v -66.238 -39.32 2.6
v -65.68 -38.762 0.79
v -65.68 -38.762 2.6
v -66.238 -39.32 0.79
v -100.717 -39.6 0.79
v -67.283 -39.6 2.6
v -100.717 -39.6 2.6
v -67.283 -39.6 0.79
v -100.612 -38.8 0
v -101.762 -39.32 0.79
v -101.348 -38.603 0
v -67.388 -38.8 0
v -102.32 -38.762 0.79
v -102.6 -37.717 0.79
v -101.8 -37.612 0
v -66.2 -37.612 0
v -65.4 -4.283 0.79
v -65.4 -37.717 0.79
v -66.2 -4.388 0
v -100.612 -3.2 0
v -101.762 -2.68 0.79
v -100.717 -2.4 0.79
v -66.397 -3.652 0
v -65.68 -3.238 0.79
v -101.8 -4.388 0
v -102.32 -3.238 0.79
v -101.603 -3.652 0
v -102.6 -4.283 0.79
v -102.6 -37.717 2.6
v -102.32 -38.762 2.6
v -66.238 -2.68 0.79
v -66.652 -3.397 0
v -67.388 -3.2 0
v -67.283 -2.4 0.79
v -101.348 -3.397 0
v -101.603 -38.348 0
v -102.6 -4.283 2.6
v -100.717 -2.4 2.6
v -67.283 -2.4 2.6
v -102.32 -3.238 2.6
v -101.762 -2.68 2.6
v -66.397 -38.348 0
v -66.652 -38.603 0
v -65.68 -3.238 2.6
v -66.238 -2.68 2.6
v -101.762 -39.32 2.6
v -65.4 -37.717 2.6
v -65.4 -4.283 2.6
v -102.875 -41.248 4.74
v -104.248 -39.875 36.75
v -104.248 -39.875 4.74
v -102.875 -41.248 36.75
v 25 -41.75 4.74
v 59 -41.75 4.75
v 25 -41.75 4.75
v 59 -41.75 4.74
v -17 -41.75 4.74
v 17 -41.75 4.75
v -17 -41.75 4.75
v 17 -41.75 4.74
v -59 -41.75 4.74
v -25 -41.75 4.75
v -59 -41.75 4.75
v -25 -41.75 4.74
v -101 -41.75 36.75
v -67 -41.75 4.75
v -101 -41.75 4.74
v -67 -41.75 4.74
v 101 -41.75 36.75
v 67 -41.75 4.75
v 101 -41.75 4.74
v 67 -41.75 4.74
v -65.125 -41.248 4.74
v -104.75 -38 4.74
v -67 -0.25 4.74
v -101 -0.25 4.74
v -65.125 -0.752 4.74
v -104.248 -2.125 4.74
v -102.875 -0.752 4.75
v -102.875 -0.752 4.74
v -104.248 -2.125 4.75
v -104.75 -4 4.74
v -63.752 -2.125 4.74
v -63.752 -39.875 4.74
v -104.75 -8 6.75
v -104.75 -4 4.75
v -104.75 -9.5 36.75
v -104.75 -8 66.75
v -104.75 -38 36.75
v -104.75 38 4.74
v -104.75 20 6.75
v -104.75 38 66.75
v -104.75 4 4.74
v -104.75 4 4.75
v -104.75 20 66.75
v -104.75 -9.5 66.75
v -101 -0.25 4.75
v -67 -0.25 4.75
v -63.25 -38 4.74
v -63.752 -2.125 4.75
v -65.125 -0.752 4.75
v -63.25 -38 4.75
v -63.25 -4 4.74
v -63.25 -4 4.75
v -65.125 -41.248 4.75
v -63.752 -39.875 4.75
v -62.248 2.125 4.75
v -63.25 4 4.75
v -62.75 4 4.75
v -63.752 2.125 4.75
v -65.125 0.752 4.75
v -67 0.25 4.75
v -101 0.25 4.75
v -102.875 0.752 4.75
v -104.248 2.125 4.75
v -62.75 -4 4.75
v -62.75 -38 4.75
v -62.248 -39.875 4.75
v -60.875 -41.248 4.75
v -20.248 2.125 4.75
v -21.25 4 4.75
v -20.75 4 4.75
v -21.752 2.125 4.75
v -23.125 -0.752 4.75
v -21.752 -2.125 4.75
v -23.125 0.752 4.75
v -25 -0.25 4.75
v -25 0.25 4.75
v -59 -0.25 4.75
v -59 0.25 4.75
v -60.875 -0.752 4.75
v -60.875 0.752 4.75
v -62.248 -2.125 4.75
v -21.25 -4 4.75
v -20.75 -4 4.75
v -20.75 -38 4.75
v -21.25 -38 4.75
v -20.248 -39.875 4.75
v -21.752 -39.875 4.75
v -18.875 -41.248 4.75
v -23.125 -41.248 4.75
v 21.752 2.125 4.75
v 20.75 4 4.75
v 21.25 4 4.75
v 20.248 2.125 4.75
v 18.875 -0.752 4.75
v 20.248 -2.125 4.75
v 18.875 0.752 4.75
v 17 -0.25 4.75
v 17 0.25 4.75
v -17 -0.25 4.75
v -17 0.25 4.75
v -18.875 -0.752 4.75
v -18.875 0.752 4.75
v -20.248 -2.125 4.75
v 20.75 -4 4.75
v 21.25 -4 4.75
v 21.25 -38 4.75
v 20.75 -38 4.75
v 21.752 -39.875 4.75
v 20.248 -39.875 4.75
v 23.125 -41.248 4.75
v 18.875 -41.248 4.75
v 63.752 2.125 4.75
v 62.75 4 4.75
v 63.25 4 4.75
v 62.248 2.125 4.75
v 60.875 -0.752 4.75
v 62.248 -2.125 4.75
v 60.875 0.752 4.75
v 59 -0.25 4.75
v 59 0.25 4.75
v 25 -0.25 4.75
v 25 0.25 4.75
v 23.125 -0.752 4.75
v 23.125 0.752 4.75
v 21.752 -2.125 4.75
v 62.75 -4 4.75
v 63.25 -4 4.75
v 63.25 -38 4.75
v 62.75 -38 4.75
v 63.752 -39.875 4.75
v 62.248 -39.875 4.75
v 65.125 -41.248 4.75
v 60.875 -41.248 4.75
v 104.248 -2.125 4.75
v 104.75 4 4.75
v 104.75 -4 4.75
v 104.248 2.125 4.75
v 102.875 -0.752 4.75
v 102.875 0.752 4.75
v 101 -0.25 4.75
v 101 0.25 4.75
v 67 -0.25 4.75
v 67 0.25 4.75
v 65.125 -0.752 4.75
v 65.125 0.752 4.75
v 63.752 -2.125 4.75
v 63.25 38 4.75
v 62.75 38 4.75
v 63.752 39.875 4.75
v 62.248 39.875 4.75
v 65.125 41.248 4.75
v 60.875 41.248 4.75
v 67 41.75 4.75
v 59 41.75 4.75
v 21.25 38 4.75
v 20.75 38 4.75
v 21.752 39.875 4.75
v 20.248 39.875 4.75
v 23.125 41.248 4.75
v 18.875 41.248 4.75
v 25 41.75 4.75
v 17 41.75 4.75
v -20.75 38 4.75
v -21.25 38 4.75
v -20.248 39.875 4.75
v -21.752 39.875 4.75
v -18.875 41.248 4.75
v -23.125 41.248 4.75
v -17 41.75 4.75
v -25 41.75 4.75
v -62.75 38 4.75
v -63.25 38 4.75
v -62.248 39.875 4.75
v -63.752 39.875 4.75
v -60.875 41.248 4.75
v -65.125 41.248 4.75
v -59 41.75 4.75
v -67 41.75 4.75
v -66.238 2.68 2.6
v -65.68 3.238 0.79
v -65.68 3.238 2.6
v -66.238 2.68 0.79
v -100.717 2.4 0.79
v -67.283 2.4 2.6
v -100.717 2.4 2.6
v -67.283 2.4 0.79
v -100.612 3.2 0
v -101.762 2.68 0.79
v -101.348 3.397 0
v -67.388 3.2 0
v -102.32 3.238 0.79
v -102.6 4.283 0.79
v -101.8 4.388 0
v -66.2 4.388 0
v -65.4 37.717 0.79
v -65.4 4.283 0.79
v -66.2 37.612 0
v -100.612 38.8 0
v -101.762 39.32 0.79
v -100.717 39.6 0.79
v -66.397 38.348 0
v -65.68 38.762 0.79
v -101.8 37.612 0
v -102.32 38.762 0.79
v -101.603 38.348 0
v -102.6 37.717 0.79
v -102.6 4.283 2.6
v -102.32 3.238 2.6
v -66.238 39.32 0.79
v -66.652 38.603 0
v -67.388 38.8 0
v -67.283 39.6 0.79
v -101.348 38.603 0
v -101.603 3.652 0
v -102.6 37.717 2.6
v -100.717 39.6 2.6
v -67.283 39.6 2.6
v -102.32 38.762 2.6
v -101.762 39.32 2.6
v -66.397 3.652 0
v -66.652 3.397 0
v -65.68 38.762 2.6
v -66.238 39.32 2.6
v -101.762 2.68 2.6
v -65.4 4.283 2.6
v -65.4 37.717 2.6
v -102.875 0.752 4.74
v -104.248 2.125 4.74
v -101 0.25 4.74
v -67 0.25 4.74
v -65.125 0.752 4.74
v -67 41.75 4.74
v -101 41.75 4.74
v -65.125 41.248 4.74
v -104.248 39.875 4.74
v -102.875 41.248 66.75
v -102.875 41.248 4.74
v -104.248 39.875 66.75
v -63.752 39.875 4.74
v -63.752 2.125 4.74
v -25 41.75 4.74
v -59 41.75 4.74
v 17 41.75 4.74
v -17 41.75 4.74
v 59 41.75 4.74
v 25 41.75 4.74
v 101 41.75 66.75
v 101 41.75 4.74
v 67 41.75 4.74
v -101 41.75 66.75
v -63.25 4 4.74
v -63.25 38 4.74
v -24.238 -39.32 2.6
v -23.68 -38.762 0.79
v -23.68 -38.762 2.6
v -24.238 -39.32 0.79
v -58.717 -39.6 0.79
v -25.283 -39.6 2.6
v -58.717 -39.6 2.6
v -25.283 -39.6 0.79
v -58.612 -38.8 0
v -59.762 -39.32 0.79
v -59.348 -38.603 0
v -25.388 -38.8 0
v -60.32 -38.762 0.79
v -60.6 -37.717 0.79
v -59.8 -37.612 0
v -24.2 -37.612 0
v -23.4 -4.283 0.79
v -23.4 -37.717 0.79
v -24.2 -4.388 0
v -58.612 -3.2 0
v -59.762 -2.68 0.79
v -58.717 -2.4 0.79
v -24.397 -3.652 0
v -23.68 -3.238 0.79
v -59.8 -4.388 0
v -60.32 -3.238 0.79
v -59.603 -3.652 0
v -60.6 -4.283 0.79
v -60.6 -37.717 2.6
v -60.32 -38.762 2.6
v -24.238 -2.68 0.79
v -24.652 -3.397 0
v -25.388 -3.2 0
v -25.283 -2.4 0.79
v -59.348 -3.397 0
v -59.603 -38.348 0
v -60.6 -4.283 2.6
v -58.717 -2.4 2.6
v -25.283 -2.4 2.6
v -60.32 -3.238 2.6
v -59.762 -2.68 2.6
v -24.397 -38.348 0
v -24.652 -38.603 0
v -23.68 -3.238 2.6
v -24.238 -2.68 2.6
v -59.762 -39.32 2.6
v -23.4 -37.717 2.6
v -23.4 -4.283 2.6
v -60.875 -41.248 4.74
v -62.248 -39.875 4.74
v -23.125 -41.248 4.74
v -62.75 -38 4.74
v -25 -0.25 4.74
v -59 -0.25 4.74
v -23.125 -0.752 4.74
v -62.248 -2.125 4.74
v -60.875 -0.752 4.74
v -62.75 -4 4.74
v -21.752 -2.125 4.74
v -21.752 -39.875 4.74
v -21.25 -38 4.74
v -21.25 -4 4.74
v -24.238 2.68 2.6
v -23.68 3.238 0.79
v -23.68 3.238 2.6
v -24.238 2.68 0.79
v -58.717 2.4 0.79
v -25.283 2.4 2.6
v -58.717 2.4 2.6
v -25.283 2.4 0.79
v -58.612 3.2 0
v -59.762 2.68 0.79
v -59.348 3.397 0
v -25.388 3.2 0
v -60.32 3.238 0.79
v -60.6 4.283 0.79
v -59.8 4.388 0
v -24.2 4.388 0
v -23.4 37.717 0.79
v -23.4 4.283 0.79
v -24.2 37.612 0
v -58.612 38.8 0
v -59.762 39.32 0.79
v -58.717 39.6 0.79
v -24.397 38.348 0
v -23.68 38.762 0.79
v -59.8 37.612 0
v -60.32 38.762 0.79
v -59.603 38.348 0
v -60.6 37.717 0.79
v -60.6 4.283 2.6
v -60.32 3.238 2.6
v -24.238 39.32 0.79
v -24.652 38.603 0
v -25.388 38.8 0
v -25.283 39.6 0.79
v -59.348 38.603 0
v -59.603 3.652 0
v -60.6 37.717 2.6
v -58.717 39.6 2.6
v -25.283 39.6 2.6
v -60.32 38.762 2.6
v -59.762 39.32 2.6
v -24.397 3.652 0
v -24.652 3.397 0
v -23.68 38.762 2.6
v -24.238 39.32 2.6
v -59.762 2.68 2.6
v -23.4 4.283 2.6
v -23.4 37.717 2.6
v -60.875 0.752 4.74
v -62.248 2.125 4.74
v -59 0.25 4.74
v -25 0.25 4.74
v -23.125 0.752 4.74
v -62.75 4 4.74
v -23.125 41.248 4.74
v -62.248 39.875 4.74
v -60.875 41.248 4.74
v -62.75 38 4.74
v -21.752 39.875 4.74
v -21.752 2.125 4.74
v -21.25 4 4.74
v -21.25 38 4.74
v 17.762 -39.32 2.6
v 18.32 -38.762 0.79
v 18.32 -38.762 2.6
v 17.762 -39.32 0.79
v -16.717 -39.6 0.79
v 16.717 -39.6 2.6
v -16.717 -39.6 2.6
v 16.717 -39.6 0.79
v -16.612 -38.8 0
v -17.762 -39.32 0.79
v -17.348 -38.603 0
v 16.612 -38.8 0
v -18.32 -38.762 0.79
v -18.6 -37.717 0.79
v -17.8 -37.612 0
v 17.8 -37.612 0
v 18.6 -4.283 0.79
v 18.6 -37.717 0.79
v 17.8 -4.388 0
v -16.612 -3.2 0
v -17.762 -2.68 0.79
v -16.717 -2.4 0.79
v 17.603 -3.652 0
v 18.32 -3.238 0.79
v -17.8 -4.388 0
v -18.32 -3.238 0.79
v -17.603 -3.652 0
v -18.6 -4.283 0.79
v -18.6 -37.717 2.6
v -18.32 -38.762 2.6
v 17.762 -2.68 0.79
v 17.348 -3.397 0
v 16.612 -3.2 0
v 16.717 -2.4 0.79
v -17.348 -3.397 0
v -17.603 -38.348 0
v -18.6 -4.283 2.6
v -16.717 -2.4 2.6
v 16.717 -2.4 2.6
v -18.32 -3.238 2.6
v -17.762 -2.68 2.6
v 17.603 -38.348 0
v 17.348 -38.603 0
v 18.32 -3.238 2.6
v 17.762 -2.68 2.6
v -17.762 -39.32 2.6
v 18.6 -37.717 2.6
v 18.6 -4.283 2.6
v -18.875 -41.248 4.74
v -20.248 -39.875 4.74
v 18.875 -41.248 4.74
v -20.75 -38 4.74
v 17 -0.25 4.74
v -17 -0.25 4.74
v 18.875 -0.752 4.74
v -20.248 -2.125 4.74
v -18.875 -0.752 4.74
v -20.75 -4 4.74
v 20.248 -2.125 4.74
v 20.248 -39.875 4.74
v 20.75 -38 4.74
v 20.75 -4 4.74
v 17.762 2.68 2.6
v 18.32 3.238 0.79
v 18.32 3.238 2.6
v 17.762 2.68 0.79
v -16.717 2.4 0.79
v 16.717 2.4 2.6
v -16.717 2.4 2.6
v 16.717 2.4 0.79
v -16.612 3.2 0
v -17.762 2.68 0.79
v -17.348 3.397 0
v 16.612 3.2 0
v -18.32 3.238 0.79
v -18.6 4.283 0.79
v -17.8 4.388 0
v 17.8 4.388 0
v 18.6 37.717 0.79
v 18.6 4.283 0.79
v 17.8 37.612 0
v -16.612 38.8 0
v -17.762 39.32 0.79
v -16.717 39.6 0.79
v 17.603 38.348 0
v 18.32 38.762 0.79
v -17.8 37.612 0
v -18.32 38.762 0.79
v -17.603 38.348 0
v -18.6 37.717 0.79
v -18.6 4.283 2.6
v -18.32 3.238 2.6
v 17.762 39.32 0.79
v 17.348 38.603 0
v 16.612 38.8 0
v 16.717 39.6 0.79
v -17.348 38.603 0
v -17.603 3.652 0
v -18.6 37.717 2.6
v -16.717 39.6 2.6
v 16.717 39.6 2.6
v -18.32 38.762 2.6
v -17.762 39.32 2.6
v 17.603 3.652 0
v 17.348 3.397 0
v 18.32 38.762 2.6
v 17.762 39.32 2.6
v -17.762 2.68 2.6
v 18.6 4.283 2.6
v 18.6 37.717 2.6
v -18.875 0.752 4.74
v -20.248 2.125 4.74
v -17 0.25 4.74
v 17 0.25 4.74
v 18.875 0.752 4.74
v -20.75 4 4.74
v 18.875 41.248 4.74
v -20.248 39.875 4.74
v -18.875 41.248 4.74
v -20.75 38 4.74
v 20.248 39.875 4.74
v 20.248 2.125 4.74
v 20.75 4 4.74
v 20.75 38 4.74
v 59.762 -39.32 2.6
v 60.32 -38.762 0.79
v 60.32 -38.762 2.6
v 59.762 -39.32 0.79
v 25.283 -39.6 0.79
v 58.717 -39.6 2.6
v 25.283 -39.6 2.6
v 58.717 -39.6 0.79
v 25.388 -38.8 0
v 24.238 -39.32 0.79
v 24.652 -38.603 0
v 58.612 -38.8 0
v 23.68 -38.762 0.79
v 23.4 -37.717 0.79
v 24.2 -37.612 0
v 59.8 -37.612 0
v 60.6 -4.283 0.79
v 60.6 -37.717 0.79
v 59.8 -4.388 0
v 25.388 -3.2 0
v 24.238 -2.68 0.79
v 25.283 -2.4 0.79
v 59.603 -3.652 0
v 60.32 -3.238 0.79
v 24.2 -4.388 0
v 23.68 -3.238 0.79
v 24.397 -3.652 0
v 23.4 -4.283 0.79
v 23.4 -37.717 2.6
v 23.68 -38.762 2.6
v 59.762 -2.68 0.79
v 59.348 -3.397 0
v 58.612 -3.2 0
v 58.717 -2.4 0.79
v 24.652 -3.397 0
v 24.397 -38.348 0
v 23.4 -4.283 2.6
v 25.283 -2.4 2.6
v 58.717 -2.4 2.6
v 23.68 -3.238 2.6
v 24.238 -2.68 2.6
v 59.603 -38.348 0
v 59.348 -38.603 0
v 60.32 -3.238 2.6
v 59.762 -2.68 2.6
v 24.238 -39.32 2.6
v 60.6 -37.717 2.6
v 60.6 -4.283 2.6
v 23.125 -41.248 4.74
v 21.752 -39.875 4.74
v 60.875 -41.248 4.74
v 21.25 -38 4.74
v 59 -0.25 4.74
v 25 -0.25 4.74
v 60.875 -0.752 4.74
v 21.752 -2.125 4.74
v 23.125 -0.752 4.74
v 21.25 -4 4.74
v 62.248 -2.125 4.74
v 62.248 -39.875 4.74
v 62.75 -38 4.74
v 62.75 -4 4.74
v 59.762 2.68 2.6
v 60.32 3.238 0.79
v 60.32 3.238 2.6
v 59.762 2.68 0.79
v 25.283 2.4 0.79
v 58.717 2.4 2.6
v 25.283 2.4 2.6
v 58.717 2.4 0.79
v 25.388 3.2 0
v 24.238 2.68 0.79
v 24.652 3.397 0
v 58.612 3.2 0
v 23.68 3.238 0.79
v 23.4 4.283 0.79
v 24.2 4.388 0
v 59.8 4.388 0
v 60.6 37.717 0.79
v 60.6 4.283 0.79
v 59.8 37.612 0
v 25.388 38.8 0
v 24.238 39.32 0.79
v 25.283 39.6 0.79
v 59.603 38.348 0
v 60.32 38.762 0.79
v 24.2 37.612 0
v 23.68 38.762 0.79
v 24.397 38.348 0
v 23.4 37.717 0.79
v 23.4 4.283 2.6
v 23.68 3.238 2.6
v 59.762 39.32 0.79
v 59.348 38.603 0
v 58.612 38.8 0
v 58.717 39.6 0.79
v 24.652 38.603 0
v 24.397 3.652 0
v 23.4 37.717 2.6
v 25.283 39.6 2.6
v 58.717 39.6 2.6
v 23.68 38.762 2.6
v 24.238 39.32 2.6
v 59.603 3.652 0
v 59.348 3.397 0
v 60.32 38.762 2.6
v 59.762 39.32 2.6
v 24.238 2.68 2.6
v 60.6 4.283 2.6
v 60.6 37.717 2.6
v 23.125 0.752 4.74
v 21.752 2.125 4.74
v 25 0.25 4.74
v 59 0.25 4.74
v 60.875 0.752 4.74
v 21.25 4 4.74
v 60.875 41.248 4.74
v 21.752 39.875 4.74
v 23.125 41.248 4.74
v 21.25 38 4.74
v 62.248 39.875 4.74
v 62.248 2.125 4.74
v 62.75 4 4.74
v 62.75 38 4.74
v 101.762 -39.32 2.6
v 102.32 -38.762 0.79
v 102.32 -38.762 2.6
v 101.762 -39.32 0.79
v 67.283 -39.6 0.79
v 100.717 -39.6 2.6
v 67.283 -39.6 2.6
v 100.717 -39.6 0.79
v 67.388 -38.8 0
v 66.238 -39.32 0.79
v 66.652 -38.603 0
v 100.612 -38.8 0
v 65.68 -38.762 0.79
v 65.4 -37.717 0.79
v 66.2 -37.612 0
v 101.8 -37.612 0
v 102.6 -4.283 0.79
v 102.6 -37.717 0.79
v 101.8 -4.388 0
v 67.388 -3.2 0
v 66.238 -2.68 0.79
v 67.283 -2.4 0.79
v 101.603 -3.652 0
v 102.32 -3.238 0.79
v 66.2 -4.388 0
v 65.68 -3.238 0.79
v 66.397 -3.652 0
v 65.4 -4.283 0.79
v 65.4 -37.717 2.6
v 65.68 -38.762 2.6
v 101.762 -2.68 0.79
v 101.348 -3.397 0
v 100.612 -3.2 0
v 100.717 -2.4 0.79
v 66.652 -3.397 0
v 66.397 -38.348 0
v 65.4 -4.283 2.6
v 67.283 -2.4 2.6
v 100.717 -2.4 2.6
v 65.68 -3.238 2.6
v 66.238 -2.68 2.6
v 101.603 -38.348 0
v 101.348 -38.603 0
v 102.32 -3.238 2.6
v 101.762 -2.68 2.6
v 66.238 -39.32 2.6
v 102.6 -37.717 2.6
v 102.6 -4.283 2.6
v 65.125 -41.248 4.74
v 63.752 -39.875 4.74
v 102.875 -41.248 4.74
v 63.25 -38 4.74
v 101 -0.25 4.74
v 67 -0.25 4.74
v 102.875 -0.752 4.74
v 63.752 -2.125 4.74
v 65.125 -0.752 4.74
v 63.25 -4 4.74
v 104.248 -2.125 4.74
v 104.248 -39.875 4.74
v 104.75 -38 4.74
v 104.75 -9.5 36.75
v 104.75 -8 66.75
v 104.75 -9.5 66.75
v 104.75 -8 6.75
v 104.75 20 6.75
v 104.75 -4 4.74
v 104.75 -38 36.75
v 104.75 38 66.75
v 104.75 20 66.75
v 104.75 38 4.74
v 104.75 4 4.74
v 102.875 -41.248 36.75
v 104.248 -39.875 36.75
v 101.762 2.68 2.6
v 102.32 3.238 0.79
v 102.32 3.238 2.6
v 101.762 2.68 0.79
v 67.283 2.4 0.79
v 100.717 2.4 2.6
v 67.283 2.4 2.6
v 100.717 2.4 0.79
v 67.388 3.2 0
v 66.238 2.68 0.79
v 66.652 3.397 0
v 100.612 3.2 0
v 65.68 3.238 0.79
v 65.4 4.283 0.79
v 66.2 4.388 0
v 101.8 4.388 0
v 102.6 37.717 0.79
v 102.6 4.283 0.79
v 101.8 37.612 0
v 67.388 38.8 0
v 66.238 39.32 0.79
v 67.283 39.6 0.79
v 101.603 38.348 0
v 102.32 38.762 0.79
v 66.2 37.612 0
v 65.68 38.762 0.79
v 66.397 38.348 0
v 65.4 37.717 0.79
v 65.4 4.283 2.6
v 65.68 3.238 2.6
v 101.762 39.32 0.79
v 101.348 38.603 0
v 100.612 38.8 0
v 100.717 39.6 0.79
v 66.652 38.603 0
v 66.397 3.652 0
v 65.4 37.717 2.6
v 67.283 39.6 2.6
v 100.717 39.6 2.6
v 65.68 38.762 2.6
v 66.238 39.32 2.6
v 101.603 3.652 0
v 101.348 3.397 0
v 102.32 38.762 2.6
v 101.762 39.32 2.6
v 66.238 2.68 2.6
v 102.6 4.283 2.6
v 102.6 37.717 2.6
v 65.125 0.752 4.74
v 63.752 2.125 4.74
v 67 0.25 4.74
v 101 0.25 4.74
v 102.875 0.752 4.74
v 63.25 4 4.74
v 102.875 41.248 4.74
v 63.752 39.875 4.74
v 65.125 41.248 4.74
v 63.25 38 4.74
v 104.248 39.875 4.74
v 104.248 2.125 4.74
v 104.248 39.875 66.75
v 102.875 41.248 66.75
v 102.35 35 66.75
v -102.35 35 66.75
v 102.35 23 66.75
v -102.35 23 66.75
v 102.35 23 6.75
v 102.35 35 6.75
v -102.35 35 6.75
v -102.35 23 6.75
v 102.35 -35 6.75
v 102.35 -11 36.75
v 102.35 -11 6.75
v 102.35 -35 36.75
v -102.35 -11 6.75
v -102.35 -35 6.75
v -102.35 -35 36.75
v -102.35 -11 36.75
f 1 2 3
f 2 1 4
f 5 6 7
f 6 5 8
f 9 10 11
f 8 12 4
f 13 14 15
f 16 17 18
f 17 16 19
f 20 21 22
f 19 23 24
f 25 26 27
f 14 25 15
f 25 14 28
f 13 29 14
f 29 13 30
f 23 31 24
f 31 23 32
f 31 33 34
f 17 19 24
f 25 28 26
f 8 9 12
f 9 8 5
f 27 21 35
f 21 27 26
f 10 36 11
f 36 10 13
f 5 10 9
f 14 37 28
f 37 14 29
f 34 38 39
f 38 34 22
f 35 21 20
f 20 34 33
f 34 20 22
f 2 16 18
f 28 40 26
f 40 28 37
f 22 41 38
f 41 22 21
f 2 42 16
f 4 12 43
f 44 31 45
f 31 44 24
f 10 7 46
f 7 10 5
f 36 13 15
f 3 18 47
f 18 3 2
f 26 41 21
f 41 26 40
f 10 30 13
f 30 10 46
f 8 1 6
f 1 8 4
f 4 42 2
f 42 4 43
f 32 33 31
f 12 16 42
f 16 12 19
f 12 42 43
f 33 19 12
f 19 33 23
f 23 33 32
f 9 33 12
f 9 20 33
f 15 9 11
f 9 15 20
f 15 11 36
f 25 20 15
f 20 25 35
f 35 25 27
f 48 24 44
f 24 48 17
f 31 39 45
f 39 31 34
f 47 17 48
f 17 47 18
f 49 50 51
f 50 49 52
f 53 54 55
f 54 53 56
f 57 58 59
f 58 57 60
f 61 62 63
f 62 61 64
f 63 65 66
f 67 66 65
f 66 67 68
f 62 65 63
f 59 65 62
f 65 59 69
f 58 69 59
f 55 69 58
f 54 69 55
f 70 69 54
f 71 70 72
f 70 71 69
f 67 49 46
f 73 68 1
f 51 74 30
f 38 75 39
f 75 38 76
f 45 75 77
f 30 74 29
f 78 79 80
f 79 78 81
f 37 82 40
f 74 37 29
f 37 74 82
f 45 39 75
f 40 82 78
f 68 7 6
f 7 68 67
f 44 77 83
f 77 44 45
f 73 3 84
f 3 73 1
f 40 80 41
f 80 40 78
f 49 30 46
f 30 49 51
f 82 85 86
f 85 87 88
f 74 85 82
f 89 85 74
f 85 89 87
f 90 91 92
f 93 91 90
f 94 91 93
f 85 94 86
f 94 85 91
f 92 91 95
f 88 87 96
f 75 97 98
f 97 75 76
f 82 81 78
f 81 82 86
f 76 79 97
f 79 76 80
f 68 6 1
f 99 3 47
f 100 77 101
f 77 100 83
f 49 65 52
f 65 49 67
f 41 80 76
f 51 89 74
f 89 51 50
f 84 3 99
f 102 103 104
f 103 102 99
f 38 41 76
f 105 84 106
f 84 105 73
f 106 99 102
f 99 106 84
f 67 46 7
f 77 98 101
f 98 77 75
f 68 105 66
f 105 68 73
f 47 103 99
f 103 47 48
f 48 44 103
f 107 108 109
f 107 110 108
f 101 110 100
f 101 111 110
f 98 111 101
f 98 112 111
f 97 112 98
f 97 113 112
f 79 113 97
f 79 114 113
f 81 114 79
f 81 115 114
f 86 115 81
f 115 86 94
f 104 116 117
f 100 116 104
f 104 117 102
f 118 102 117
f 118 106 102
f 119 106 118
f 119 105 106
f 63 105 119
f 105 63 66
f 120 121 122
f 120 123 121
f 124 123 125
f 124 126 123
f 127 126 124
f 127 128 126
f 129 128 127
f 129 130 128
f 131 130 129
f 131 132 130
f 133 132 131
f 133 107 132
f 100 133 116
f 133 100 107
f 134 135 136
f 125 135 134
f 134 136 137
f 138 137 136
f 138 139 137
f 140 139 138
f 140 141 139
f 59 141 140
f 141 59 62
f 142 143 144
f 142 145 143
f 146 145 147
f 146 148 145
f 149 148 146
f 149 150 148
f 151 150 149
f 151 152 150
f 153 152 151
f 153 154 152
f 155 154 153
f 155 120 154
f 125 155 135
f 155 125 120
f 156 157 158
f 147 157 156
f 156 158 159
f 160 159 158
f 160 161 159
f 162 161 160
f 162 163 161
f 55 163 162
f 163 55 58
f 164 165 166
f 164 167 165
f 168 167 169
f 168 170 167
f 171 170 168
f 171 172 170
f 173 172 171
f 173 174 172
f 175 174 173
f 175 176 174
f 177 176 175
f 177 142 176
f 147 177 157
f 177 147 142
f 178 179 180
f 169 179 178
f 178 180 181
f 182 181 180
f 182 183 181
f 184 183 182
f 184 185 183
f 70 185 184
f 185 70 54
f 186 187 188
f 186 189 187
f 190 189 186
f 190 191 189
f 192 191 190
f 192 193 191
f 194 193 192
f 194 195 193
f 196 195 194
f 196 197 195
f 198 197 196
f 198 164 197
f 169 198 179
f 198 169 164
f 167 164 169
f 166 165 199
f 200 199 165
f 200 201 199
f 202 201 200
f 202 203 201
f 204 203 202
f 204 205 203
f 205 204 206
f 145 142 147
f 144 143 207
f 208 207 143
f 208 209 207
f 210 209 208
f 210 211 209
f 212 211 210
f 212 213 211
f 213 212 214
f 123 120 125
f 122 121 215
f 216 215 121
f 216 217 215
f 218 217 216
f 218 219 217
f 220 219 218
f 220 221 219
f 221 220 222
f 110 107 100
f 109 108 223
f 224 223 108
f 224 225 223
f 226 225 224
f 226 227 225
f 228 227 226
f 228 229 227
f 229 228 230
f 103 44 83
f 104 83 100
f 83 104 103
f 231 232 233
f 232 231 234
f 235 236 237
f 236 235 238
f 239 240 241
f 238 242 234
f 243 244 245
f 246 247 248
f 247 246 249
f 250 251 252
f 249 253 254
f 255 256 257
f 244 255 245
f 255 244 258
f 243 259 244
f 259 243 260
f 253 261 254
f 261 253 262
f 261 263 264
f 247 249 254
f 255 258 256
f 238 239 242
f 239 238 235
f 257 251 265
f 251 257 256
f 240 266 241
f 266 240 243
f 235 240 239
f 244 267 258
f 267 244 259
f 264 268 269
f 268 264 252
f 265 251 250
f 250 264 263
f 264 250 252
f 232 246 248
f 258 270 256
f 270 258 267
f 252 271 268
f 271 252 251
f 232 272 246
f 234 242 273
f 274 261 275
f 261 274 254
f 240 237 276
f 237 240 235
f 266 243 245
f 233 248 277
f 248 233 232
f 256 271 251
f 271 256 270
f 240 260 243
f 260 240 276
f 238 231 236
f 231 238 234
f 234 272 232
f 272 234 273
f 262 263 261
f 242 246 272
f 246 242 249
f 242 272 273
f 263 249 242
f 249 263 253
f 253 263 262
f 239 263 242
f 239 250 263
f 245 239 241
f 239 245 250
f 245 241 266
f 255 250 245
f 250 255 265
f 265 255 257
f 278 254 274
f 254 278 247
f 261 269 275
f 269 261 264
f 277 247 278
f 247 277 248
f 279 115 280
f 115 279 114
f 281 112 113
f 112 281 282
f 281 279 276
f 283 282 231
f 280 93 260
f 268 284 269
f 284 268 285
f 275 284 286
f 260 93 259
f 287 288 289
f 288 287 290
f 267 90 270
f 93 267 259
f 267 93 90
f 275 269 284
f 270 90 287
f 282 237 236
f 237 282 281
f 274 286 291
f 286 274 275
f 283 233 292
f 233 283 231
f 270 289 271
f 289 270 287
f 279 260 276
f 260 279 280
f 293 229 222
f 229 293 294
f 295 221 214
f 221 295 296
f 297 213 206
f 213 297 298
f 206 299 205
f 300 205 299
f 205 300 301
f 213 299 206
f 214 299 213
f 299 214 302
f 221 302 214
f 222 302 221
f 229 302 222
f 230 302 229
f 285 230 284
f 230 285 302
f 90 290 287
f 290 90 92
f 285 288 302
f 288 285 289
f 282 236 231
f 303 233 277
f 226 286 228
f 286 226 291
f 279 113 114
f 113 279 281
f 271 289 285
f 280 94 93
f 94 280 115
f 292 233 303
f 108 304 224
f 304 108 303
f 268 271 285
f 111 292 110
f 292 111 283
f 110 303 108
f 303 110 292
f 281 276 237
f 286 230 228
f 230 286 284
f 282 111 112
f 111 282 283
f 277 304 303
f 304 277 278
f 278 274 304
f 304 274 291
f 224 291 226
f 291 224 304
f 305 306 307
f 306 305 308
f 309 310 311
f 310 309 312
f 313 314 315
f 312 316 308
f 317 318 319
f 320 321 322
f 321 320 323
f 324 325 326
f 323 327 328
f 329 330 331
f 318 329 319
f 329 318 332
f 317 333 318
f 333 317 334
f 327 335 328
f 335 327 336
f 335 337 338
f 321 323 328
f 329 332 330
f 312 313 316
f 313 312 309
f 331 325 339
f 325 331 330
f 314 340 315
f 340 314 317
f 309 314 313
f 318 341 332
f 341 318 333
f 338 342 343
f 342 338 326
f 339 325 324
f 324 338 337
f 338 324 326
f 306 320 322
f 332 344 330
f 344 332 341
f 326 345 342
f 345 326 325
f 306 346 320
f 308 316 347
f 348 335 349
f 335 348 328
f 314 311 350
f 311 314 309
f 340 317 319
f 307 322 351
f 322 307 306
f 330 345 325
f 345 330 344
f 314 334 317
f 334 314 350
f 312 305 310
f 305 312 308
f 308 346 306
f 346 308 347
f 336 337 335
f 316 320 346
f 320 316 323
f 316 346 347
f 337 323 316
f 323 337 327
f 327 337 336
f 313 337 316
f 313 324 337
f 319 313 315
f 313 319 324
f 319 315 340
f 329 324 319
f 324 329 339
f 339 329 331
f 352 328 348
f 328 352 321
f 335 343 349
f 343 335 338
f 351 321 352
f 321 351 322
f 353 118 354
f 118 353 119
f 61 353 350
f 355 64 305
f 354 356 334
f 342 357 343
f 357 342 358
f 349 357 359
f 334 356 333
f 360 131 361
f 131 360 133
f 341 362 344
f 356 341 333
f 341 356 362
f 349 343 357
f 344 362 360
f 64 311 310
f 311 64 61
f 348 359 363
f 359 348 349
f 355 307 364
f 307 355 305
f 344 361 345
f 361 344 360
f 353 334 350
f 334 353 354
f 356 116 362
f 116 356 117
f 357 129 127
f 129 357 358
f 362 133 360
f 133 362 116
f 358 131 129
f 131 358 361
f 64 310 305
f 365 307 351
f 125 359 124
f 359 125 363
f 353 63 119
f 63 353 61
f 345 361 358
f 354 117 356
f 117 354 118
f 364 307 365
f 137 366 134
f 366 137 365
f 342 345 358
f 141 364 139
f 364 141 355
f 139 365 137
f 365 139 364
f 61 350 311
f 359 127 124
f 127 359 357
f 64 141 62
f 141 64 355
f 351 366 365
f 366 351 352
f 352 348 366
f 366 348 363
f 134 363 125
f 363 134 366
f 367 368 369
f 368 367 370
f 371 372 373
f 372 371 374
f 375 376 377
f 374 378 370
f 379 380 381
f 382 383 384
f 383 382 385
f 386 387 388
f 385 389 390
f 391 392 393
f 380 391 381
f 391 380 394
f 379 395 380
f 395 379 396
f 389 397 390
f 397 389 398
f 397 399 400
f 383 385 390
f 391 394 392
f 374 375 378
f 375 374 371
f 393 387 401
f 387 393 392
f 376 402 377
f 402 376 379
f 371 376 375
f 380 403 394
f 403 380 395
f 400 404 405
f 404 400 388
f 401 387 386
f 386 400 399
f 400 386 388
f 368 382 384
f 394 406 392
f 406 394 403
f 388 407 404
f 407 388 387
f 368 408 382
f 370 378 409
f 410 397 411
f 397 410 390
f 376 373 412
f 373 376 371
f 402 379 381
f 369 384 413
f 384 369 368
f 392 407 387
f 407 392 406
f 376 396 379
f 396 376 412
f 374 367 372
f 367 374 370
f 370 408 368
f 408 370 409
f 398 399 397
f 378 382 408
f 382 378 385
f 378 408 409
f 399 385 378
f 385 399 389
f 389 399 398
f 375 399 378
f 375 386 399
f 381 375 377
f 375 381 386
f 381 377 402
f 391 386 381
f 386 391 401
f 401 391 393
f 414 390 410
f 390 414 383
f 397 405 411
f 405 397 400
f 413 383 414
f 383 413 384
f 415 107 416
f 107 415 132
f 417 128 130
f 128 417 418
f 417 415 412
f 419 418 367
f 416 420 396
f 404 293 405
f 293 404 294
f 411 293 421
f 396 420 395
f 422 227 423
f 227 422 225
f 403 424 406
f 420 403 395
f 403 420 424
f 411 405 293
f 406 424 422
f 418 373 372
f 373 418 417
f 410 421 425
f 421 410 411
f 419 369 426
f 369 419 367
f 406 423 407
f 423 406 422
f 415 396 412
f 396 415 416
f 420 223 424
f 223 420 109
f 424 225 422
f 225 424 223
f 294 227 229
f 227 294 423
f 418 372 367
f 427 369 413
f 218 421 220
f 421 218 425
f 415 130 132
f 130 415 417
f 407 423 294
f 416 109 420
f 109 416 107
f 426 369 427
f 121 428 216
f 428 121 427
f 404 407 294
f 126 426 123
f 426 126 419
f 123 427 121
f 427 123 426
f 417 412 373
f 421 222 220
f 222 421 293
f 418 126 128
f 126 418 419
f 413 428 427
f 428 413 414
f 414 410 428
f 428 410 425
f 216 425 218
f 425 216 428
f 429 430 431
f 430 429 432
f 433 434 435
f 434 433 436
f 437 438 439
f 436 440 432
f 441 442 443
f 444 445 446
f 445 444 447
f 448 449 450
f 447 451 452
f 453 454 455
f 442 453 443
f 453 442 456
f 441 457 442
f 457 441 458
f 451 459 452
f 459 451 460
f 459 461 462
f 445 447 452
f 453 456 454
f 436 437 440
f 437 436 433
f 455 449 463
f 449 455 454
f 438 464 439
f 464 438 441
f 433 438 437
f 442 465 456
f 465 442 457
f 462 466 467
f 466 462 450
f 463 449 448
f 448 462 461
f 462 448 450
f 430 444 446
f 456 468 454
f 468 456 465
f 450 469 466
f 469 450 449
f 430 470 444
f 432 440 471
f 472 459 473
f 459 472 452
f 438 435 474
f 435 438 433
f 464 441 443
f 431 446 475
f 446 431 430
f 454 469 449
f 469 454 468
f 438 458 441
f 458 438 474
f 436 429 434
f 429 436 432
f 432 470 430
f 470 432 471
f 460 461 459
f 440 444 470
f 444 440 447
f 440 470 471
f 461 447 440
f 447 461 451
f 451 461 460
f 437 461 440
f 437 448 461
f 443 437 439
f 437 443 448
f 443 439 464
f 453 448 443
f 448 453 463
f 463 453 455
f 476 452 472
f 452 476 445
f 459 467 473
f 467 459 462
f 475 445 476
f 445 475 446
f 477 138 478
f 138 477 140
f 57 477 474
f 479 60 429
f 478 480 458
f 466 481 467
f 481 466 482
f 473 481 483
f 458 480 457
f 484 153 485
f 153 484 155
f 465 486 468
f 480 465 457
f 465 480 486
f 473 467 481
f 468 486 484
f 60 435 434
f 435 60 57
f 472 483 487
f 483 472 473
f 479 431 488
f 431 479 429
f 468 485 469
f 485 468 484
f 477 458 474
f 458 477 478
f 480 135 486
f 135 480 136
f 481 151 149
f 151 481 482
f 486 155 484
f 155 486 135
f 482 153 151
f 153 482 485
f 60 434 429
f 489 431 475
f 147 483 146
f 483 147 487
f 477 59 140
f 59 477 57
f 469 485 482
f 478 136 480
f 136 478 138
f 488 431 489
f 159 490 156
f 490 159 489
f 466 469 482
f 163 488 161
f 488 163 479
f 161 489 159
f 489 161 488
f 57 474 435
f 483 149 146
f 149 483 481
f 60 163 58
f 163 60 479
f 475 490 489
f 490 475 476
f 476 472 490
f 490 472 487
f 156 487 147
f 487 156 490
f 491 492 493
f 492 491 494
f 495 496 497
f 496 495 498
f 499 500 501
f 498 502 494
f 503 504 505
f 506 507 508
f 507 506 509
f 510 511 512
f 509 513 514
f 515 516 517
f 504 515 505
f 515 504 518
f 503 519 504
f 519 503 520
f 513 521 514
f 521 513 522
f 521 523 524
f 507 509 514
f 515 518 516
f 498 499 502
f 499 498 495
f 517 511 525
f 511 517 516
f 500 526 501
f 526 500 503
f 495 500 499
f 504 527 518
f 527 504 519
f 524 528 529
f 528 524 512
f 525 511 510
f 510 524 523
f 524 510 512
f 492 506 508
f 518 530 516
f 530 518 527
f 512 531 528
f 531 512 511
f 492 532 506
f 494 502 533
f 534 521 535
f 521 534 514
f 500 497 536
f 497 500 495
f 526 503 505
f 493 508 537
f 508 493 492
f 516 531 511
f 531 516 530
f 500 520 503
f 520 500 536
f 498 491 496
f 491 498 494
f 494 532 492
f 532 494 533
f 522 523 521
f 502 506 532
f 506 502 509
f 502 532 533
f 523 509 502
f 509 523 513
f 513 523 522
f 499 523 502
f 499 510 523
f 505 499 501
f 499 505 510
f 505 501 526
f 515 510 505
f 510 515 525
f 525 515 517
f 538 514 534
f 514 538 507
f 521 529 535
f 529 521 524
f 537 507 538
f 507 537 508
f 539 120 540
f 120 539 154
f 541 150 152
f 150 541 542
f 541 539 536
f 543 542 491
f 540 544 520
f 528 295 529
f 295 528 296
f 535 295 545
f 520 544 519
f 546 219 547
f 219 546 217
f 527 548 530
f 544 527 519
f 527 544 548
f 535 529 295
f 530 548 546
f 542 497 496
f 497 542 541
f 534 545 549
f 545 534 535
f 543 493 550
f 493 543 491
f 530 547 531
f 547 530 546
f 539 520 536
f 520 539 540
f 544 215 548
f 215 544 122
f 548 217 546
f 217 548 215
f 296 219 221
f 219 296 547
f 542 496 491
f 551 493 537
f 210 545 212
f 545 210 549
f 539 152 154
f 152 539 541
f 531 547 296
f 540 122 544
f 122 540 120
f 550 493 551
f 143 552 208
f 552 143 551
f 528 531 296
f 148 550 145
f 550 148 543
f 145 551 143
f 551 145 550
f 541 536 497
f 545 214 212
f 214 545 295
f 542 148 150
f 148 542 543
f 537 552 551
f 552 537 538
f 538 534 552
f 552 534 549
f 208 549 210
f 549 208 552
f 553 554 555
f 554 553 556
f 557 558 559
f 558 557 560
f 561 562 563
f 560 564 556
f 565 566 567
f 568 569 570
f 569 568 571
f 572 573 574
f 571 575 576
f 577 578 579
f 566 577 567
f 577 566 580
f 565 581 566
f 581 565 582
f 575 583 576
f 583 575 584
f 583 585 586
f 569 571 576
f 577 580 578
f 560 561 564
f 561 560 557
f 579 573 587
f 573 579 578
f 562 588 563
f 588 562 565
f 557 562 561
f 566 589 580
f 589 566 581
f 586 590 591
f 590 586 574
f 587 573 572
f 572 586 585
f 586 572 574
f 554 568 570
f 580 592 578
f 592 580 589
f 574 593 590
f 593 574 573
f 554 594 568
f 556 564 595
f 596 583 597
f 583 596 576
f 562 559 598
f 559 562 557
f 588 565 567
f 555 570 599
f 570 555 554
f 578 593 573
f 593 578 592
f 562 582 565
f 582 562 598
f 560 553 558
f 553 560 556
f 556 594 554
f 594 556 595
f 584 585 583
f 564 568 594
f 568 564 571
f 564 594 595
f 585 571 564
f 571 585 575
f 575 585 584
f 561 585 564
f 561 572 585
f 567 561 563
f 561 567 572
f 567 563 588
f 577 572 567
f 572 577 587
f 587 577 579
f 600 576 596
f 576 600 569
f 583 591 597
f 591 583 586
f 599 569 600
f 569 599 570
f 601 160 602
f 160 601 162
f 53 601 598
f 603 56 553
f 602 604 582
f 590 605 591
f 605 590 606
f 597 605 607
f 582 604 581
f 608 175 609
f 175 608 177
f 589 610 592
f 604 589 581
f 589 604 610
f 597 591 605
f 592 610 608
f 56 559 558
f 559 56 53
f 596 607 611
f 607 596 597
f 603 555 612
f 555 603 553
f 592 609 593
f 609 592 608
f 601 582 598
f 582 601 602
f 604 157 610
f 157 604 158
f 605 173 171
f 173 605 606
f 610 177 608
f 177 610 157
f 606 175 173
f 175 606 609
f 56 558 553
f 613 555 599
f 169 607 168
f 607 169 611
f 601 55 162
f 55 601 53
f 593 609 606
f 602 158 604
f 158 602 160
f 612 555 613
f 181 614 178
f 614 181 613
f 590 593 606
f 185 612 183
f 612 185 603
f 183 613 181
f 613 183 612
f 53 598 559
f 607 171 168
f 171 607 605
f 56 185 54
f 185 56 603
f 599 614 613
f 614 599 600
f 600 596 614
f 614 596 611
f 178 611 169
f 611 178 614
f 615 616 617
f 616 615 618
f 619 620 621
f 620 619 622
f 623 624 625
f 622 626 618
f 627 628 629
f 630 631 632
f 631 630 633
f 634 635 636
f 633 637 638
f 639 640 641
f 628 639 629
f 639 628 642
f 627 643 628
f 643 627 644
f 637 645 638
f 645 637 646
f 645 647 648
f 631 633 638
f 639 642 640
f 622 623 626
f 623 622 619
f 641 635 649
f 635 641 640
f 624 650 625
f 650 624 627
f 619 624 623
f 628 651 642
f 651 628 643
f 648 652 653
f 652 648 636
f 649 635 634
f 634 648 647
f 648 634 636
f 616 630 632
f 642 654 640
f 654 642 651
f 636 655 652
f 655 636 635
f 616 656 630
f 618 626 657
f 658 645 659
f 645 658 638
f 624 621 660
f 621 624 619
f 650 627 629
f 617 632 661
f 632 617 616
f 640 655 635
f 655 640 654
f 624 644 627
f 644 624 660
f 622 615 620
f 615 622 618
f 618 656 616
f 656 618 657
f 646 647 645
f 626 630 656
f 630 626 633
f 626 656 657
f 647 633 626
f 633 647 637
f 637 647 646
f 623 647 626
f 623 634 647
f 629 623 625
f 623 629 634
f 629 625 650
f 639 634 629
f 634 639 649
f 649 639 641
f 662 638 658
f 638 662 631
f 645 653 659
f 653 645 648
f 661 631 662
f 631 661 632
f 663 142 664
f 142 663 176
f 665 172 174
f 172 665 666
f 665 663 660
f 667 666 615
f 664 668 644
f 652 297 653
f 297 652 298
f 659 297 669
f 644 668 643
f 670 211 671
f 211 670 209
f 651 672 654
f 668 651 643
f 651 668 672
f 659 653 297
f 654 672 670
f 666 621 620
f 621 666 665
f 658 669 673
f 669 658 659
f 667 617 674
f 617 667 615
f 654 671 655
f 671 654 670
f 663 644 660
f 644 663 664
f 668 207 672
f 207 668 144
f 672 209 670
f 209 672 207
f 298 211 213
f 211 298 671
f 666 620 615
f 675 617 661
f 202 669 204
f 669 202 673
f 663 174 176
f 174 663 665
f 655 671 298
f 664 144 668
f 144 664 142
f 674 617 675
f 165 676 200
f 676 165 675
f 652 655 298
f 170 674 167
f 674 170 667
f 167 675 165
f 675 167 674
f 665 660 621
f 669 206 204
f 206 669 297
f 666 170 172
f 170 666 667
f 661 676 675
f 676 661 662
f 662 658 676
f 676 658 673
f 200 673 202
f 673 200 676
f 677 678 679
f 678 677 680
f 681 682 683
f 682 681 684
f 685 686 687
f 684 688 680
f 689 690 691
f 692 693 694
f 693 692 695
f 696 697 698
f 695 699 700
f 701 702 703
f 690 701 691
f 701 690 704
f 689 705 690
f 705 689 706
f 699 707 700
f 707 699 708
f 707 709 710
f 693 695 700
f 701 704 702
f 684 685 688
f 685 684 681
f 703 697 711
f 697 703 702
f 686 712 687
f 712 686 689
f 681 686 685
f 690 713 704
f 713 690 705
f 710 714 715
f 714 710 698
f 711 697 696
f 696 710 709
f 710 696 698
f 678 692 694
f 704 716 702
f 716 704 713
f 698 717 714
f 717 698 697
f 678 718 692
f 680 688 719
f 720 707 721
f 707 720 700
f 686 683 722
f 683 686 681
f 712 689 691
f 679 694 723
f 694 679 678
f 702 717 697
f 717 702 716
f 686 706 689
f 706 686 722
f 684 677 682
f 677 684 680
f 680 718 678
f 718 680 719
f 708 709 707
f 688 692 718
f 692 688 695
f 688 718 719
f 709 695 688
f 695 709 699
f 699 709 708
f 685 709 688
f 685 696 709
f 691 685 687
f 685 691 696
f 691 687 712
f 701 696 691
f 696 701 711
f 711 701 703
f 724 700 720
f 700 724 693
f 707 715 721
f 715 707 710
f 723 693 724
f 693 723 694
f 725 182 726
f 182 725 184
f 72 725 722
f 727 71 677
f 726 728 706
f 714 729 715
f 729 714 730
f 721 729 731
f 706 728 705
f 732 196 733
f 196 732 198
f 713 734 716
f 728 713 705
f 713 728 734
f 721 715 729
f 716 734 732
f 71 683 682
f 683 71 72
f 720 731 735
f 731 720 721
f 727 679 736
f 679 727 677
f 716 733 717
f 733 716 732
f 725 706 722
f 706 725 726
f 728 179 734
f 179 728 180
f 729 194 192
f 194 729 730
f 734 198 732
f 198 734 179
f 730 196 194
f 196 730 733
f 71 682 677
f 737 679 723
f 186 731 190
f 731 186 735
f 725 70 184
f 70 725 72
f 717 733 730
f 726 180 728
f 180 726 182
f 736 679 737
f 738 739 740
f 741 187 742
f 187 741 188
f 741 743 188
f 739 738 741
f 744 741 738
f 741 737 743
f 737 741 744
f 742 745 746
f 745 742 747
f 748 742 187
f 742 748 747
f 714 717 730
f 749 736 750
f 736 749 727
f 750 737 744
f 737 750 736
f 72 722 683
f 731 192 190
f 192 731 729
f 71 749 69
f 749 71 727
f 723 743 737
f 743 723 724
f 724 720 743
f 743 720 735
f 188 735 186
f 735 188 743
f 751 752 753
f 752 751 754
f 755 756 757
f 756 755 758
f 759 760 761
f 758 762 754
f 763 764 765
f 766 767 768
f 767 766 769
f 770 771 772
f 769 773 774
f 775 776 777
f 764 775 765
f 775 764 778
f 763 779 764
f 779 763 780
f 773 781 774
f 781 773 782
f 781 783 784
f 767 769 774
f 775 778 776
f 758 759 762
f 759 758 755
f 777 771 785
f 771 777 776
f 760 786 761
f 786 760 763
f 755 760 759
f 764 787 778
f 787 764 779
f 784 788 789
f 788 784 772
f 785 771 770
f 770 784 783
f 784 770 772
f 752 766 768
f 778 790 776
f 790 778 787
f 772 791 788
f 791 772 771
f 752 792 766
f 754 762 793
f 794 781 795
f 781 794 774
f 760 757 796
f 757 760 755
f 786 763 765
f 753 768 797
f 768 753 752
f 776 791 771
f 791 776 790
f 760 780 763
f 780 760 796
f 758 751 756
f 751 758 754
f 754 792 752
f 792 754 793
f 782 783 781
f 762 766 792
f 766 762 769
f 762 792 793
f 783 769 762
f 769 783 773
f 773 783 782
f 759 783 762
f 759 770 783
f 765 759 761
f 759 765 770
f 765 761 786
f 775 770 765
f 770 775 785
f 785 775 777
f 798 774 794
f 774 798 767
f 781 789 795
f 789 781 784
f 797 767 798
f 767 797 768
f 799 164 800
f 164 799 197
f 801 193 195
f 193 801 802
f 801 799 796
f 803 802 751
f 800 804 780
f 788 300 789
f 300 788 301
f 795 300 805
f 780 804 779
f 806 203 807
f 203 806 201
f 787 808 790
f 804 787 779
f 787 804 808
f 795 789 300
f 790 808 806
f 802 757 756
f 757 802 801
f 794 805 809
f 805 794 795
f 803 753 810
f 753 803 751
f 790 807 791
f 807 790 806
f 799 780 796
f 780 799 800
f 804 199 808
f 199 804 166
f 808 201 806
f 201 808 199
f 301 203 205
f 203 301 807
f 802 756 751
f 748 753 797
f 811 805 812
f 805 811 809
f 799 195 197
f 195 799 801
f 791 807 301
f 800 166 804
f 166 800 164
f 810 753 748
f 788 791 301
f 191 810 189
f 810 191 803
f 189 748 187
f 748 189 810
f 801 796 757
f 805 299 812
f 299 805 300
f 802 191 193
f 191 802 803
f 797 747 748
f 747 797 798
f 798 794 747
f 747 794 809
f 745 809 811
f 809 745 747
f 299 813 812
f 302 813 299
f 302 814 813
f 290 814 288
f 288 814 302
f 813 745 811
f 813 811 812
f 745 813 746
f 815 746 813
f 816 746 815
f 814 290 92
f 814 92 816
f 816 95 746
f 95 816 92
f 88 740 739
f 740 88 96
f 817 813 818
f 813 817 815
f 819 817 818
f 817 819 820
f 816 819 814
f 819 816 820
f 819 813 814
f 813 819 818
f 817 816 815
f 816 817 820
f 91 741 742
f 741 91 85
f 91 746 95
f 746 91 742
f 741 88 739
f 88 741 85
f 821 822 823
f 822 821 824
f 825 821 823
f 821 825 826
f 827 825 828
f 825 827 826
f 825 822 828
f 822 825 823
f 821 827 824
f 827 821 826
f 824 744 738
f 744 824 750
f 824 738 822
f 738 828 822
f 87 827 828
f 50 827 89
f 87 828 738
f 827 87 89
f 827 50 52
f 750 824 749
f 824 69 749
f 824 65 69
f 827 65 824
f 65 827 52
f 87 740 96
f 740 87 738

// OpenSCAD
// file: fixture_rack_common.scad
// fixture_rack_common — 5×2 Gridfinity storage rack for three repair fixtures, standing
// on edge like books. Storage, not use: the user's own sketch (2026-10-25).
//
// MEASURED BY THE USER (survey/MEASUREMENTS.md, 2026-10-25):
//   AMAOE M81 heat mat   190 × 245 × 8    on its 190 edge, 245 tall
//   RELIFE RL-605 Pro    179 × 210 × 24   on its 210 edge, 179 tall; knobs on both
//                                         ends about halfway up
//   RELIFE TF5           60 × 182 × 20    on its 182 edge (knobs included), 60 tall
//
// THE RL-605's SLOT HAS NO END WALLS. Five cells is 209.5 outside but ~207 inside
// the end walls, and the RL-605 is 210 long — so its slot runs straight out both
// ends, the plate sits across the whole length, and its knobs hang over the ends
// well above the rim (user's call). The other two fit inside walled slots.
//
// STEPPED, AS SKETCHED: the back section (mat, RL-605) stands BACK_H; the front
// section (TF5) steps down to FRONT_H so a hand gets in.
//
// PRINT: as emitted, feet down. No supports.
//
// SPDX-License-Identifier: CC-BY-NC-4.0
// Copyright (c) 2026 Aaron Cupp

include <../lib/gridfinity.scad>

/* [Pieces — measured] */
// [name, standing length (on the floor), thickness]
MAT = [190, 8];
RL  = [210, 24];
TF5 = [182, 20];

/* [Rack] */
NX = 5; NY = 2;
CLR      = 4;      // added to each thickness — slots this much wider than the piece
WALL     = 2.4;    // outer walls
DIV      = 3.0;    // dividers — the RL-605 is the heavy one and leans on them
FLOOR    = 2.0;
BACK_H   = 60;     // above the floor: mat + RL-605, a third of the RL-605's 179
FRONT_H  = 30;     // TF5 section: half its 60 mm height

W = NX*GF - 0.5;  D = NY*GF - 0.5;
Z0 = BIN_BASE_H + FLOOR;
IN_X = W - 2*WALL;                       // inside the end walls

slots = [MAT[1] + CLR, RL[1] + CLR, TF5[1] + CLR];   // back → front
used  = slots[0] + slots[1] + slots[2] + 2*DIV;
y_back = D/2 - (D - used)/2;            // centre the group; outer walls take the rest
// back edge of each slot, going toward the front (−Y)
function y_top(i) = y_back - (i == 0 ? 0 : i == 1 ? slots[0] + DIV : slots[0] + slots[1] + 2*DIV);
step_y = y_top(2) + DIV/2;              // the step sits over the RL/TF5 divider's middle

assert(MAT[0] <= IN_X && TF5[0] <= IN_X, "Mat or TF5 longer than the walled slot.");
assert(RL[0] > IN_X, "RL-605 now fits inside end walls — give its slot end walls back.");
assert((D - used)/2 >= WALL, "Slots don't fit across two cells.");
echo(str("rack ", W, " × ", D, "; slots (back→front) ", slots, "; outer walls ", (D - used)/2,
         "; back ", Z0 + BACK_H, " tall, front ", Z0 + FRONT_H));

module slot(i, open_ends) {
    l = open_ends ? W + 2 : IN_X;
    translate([-l/2, y_top(i) - slots[i], Z0]) cube([l, slots[i], BACK_H + 1]);
}

module rack() {
    difference() {
        bin_blank(NX, NY, Z0 + BACK_H);
        slot(0, false);   // heat mat
        slot(1, true);    // RL-605: open both ends
        slot(2, false);   // TF5
        // the step: everything in front of it comes down to FRONT_H
        translate([-W, -D, Z0 + FRONT_H]) cube([2*W, step_y + D, BACK_H]);
    }
}

// LAYOUT COUPON: the rack's exact top-view outline — outer walls, dividers, end
// walls, the RL-605's open ends — at full length but only FRAME_H tall, with no
// floor and no feet. Lay each fixture in its slot to check length AND thickness
// for ~25 g instead of the whole rack.
FRAME_H = 5;
TIE_T   = 1;   // floor strip under the RL-605 slot only. Its open ends would
               // otherwise cut the frame into two loose halves; the rack's own
               // floor does this job. It runs 1 mm under each divider, a
               // partial-area join, so it overlaps rather than butts.
module layout_coupon() {
    translate([-W/2, y_top(1) - slots[1] - 1, 0]) cube([W, slots[1] + 2, TIE_T]);
    linear_extrude(FRAME_H) difference() {
        offset(r = BIN_R) offset(delta = -BIN_R) square([W, D], center = true);
        for (i = [0:2]) {
            l = (i == 1) ? W + 2 : IN_X;     // RL-605 runs out both ends
            translate([-l/2, y_top(i) - slots[i]]) square([l, slots[i]]);
        }
    }
}
// main file
// fixture_rack — see fixture_rack_common.scad for the design notes.
// PRINT: as emitted, feet down. No supports.
include <fixture_rack_common.scad>
rack();
